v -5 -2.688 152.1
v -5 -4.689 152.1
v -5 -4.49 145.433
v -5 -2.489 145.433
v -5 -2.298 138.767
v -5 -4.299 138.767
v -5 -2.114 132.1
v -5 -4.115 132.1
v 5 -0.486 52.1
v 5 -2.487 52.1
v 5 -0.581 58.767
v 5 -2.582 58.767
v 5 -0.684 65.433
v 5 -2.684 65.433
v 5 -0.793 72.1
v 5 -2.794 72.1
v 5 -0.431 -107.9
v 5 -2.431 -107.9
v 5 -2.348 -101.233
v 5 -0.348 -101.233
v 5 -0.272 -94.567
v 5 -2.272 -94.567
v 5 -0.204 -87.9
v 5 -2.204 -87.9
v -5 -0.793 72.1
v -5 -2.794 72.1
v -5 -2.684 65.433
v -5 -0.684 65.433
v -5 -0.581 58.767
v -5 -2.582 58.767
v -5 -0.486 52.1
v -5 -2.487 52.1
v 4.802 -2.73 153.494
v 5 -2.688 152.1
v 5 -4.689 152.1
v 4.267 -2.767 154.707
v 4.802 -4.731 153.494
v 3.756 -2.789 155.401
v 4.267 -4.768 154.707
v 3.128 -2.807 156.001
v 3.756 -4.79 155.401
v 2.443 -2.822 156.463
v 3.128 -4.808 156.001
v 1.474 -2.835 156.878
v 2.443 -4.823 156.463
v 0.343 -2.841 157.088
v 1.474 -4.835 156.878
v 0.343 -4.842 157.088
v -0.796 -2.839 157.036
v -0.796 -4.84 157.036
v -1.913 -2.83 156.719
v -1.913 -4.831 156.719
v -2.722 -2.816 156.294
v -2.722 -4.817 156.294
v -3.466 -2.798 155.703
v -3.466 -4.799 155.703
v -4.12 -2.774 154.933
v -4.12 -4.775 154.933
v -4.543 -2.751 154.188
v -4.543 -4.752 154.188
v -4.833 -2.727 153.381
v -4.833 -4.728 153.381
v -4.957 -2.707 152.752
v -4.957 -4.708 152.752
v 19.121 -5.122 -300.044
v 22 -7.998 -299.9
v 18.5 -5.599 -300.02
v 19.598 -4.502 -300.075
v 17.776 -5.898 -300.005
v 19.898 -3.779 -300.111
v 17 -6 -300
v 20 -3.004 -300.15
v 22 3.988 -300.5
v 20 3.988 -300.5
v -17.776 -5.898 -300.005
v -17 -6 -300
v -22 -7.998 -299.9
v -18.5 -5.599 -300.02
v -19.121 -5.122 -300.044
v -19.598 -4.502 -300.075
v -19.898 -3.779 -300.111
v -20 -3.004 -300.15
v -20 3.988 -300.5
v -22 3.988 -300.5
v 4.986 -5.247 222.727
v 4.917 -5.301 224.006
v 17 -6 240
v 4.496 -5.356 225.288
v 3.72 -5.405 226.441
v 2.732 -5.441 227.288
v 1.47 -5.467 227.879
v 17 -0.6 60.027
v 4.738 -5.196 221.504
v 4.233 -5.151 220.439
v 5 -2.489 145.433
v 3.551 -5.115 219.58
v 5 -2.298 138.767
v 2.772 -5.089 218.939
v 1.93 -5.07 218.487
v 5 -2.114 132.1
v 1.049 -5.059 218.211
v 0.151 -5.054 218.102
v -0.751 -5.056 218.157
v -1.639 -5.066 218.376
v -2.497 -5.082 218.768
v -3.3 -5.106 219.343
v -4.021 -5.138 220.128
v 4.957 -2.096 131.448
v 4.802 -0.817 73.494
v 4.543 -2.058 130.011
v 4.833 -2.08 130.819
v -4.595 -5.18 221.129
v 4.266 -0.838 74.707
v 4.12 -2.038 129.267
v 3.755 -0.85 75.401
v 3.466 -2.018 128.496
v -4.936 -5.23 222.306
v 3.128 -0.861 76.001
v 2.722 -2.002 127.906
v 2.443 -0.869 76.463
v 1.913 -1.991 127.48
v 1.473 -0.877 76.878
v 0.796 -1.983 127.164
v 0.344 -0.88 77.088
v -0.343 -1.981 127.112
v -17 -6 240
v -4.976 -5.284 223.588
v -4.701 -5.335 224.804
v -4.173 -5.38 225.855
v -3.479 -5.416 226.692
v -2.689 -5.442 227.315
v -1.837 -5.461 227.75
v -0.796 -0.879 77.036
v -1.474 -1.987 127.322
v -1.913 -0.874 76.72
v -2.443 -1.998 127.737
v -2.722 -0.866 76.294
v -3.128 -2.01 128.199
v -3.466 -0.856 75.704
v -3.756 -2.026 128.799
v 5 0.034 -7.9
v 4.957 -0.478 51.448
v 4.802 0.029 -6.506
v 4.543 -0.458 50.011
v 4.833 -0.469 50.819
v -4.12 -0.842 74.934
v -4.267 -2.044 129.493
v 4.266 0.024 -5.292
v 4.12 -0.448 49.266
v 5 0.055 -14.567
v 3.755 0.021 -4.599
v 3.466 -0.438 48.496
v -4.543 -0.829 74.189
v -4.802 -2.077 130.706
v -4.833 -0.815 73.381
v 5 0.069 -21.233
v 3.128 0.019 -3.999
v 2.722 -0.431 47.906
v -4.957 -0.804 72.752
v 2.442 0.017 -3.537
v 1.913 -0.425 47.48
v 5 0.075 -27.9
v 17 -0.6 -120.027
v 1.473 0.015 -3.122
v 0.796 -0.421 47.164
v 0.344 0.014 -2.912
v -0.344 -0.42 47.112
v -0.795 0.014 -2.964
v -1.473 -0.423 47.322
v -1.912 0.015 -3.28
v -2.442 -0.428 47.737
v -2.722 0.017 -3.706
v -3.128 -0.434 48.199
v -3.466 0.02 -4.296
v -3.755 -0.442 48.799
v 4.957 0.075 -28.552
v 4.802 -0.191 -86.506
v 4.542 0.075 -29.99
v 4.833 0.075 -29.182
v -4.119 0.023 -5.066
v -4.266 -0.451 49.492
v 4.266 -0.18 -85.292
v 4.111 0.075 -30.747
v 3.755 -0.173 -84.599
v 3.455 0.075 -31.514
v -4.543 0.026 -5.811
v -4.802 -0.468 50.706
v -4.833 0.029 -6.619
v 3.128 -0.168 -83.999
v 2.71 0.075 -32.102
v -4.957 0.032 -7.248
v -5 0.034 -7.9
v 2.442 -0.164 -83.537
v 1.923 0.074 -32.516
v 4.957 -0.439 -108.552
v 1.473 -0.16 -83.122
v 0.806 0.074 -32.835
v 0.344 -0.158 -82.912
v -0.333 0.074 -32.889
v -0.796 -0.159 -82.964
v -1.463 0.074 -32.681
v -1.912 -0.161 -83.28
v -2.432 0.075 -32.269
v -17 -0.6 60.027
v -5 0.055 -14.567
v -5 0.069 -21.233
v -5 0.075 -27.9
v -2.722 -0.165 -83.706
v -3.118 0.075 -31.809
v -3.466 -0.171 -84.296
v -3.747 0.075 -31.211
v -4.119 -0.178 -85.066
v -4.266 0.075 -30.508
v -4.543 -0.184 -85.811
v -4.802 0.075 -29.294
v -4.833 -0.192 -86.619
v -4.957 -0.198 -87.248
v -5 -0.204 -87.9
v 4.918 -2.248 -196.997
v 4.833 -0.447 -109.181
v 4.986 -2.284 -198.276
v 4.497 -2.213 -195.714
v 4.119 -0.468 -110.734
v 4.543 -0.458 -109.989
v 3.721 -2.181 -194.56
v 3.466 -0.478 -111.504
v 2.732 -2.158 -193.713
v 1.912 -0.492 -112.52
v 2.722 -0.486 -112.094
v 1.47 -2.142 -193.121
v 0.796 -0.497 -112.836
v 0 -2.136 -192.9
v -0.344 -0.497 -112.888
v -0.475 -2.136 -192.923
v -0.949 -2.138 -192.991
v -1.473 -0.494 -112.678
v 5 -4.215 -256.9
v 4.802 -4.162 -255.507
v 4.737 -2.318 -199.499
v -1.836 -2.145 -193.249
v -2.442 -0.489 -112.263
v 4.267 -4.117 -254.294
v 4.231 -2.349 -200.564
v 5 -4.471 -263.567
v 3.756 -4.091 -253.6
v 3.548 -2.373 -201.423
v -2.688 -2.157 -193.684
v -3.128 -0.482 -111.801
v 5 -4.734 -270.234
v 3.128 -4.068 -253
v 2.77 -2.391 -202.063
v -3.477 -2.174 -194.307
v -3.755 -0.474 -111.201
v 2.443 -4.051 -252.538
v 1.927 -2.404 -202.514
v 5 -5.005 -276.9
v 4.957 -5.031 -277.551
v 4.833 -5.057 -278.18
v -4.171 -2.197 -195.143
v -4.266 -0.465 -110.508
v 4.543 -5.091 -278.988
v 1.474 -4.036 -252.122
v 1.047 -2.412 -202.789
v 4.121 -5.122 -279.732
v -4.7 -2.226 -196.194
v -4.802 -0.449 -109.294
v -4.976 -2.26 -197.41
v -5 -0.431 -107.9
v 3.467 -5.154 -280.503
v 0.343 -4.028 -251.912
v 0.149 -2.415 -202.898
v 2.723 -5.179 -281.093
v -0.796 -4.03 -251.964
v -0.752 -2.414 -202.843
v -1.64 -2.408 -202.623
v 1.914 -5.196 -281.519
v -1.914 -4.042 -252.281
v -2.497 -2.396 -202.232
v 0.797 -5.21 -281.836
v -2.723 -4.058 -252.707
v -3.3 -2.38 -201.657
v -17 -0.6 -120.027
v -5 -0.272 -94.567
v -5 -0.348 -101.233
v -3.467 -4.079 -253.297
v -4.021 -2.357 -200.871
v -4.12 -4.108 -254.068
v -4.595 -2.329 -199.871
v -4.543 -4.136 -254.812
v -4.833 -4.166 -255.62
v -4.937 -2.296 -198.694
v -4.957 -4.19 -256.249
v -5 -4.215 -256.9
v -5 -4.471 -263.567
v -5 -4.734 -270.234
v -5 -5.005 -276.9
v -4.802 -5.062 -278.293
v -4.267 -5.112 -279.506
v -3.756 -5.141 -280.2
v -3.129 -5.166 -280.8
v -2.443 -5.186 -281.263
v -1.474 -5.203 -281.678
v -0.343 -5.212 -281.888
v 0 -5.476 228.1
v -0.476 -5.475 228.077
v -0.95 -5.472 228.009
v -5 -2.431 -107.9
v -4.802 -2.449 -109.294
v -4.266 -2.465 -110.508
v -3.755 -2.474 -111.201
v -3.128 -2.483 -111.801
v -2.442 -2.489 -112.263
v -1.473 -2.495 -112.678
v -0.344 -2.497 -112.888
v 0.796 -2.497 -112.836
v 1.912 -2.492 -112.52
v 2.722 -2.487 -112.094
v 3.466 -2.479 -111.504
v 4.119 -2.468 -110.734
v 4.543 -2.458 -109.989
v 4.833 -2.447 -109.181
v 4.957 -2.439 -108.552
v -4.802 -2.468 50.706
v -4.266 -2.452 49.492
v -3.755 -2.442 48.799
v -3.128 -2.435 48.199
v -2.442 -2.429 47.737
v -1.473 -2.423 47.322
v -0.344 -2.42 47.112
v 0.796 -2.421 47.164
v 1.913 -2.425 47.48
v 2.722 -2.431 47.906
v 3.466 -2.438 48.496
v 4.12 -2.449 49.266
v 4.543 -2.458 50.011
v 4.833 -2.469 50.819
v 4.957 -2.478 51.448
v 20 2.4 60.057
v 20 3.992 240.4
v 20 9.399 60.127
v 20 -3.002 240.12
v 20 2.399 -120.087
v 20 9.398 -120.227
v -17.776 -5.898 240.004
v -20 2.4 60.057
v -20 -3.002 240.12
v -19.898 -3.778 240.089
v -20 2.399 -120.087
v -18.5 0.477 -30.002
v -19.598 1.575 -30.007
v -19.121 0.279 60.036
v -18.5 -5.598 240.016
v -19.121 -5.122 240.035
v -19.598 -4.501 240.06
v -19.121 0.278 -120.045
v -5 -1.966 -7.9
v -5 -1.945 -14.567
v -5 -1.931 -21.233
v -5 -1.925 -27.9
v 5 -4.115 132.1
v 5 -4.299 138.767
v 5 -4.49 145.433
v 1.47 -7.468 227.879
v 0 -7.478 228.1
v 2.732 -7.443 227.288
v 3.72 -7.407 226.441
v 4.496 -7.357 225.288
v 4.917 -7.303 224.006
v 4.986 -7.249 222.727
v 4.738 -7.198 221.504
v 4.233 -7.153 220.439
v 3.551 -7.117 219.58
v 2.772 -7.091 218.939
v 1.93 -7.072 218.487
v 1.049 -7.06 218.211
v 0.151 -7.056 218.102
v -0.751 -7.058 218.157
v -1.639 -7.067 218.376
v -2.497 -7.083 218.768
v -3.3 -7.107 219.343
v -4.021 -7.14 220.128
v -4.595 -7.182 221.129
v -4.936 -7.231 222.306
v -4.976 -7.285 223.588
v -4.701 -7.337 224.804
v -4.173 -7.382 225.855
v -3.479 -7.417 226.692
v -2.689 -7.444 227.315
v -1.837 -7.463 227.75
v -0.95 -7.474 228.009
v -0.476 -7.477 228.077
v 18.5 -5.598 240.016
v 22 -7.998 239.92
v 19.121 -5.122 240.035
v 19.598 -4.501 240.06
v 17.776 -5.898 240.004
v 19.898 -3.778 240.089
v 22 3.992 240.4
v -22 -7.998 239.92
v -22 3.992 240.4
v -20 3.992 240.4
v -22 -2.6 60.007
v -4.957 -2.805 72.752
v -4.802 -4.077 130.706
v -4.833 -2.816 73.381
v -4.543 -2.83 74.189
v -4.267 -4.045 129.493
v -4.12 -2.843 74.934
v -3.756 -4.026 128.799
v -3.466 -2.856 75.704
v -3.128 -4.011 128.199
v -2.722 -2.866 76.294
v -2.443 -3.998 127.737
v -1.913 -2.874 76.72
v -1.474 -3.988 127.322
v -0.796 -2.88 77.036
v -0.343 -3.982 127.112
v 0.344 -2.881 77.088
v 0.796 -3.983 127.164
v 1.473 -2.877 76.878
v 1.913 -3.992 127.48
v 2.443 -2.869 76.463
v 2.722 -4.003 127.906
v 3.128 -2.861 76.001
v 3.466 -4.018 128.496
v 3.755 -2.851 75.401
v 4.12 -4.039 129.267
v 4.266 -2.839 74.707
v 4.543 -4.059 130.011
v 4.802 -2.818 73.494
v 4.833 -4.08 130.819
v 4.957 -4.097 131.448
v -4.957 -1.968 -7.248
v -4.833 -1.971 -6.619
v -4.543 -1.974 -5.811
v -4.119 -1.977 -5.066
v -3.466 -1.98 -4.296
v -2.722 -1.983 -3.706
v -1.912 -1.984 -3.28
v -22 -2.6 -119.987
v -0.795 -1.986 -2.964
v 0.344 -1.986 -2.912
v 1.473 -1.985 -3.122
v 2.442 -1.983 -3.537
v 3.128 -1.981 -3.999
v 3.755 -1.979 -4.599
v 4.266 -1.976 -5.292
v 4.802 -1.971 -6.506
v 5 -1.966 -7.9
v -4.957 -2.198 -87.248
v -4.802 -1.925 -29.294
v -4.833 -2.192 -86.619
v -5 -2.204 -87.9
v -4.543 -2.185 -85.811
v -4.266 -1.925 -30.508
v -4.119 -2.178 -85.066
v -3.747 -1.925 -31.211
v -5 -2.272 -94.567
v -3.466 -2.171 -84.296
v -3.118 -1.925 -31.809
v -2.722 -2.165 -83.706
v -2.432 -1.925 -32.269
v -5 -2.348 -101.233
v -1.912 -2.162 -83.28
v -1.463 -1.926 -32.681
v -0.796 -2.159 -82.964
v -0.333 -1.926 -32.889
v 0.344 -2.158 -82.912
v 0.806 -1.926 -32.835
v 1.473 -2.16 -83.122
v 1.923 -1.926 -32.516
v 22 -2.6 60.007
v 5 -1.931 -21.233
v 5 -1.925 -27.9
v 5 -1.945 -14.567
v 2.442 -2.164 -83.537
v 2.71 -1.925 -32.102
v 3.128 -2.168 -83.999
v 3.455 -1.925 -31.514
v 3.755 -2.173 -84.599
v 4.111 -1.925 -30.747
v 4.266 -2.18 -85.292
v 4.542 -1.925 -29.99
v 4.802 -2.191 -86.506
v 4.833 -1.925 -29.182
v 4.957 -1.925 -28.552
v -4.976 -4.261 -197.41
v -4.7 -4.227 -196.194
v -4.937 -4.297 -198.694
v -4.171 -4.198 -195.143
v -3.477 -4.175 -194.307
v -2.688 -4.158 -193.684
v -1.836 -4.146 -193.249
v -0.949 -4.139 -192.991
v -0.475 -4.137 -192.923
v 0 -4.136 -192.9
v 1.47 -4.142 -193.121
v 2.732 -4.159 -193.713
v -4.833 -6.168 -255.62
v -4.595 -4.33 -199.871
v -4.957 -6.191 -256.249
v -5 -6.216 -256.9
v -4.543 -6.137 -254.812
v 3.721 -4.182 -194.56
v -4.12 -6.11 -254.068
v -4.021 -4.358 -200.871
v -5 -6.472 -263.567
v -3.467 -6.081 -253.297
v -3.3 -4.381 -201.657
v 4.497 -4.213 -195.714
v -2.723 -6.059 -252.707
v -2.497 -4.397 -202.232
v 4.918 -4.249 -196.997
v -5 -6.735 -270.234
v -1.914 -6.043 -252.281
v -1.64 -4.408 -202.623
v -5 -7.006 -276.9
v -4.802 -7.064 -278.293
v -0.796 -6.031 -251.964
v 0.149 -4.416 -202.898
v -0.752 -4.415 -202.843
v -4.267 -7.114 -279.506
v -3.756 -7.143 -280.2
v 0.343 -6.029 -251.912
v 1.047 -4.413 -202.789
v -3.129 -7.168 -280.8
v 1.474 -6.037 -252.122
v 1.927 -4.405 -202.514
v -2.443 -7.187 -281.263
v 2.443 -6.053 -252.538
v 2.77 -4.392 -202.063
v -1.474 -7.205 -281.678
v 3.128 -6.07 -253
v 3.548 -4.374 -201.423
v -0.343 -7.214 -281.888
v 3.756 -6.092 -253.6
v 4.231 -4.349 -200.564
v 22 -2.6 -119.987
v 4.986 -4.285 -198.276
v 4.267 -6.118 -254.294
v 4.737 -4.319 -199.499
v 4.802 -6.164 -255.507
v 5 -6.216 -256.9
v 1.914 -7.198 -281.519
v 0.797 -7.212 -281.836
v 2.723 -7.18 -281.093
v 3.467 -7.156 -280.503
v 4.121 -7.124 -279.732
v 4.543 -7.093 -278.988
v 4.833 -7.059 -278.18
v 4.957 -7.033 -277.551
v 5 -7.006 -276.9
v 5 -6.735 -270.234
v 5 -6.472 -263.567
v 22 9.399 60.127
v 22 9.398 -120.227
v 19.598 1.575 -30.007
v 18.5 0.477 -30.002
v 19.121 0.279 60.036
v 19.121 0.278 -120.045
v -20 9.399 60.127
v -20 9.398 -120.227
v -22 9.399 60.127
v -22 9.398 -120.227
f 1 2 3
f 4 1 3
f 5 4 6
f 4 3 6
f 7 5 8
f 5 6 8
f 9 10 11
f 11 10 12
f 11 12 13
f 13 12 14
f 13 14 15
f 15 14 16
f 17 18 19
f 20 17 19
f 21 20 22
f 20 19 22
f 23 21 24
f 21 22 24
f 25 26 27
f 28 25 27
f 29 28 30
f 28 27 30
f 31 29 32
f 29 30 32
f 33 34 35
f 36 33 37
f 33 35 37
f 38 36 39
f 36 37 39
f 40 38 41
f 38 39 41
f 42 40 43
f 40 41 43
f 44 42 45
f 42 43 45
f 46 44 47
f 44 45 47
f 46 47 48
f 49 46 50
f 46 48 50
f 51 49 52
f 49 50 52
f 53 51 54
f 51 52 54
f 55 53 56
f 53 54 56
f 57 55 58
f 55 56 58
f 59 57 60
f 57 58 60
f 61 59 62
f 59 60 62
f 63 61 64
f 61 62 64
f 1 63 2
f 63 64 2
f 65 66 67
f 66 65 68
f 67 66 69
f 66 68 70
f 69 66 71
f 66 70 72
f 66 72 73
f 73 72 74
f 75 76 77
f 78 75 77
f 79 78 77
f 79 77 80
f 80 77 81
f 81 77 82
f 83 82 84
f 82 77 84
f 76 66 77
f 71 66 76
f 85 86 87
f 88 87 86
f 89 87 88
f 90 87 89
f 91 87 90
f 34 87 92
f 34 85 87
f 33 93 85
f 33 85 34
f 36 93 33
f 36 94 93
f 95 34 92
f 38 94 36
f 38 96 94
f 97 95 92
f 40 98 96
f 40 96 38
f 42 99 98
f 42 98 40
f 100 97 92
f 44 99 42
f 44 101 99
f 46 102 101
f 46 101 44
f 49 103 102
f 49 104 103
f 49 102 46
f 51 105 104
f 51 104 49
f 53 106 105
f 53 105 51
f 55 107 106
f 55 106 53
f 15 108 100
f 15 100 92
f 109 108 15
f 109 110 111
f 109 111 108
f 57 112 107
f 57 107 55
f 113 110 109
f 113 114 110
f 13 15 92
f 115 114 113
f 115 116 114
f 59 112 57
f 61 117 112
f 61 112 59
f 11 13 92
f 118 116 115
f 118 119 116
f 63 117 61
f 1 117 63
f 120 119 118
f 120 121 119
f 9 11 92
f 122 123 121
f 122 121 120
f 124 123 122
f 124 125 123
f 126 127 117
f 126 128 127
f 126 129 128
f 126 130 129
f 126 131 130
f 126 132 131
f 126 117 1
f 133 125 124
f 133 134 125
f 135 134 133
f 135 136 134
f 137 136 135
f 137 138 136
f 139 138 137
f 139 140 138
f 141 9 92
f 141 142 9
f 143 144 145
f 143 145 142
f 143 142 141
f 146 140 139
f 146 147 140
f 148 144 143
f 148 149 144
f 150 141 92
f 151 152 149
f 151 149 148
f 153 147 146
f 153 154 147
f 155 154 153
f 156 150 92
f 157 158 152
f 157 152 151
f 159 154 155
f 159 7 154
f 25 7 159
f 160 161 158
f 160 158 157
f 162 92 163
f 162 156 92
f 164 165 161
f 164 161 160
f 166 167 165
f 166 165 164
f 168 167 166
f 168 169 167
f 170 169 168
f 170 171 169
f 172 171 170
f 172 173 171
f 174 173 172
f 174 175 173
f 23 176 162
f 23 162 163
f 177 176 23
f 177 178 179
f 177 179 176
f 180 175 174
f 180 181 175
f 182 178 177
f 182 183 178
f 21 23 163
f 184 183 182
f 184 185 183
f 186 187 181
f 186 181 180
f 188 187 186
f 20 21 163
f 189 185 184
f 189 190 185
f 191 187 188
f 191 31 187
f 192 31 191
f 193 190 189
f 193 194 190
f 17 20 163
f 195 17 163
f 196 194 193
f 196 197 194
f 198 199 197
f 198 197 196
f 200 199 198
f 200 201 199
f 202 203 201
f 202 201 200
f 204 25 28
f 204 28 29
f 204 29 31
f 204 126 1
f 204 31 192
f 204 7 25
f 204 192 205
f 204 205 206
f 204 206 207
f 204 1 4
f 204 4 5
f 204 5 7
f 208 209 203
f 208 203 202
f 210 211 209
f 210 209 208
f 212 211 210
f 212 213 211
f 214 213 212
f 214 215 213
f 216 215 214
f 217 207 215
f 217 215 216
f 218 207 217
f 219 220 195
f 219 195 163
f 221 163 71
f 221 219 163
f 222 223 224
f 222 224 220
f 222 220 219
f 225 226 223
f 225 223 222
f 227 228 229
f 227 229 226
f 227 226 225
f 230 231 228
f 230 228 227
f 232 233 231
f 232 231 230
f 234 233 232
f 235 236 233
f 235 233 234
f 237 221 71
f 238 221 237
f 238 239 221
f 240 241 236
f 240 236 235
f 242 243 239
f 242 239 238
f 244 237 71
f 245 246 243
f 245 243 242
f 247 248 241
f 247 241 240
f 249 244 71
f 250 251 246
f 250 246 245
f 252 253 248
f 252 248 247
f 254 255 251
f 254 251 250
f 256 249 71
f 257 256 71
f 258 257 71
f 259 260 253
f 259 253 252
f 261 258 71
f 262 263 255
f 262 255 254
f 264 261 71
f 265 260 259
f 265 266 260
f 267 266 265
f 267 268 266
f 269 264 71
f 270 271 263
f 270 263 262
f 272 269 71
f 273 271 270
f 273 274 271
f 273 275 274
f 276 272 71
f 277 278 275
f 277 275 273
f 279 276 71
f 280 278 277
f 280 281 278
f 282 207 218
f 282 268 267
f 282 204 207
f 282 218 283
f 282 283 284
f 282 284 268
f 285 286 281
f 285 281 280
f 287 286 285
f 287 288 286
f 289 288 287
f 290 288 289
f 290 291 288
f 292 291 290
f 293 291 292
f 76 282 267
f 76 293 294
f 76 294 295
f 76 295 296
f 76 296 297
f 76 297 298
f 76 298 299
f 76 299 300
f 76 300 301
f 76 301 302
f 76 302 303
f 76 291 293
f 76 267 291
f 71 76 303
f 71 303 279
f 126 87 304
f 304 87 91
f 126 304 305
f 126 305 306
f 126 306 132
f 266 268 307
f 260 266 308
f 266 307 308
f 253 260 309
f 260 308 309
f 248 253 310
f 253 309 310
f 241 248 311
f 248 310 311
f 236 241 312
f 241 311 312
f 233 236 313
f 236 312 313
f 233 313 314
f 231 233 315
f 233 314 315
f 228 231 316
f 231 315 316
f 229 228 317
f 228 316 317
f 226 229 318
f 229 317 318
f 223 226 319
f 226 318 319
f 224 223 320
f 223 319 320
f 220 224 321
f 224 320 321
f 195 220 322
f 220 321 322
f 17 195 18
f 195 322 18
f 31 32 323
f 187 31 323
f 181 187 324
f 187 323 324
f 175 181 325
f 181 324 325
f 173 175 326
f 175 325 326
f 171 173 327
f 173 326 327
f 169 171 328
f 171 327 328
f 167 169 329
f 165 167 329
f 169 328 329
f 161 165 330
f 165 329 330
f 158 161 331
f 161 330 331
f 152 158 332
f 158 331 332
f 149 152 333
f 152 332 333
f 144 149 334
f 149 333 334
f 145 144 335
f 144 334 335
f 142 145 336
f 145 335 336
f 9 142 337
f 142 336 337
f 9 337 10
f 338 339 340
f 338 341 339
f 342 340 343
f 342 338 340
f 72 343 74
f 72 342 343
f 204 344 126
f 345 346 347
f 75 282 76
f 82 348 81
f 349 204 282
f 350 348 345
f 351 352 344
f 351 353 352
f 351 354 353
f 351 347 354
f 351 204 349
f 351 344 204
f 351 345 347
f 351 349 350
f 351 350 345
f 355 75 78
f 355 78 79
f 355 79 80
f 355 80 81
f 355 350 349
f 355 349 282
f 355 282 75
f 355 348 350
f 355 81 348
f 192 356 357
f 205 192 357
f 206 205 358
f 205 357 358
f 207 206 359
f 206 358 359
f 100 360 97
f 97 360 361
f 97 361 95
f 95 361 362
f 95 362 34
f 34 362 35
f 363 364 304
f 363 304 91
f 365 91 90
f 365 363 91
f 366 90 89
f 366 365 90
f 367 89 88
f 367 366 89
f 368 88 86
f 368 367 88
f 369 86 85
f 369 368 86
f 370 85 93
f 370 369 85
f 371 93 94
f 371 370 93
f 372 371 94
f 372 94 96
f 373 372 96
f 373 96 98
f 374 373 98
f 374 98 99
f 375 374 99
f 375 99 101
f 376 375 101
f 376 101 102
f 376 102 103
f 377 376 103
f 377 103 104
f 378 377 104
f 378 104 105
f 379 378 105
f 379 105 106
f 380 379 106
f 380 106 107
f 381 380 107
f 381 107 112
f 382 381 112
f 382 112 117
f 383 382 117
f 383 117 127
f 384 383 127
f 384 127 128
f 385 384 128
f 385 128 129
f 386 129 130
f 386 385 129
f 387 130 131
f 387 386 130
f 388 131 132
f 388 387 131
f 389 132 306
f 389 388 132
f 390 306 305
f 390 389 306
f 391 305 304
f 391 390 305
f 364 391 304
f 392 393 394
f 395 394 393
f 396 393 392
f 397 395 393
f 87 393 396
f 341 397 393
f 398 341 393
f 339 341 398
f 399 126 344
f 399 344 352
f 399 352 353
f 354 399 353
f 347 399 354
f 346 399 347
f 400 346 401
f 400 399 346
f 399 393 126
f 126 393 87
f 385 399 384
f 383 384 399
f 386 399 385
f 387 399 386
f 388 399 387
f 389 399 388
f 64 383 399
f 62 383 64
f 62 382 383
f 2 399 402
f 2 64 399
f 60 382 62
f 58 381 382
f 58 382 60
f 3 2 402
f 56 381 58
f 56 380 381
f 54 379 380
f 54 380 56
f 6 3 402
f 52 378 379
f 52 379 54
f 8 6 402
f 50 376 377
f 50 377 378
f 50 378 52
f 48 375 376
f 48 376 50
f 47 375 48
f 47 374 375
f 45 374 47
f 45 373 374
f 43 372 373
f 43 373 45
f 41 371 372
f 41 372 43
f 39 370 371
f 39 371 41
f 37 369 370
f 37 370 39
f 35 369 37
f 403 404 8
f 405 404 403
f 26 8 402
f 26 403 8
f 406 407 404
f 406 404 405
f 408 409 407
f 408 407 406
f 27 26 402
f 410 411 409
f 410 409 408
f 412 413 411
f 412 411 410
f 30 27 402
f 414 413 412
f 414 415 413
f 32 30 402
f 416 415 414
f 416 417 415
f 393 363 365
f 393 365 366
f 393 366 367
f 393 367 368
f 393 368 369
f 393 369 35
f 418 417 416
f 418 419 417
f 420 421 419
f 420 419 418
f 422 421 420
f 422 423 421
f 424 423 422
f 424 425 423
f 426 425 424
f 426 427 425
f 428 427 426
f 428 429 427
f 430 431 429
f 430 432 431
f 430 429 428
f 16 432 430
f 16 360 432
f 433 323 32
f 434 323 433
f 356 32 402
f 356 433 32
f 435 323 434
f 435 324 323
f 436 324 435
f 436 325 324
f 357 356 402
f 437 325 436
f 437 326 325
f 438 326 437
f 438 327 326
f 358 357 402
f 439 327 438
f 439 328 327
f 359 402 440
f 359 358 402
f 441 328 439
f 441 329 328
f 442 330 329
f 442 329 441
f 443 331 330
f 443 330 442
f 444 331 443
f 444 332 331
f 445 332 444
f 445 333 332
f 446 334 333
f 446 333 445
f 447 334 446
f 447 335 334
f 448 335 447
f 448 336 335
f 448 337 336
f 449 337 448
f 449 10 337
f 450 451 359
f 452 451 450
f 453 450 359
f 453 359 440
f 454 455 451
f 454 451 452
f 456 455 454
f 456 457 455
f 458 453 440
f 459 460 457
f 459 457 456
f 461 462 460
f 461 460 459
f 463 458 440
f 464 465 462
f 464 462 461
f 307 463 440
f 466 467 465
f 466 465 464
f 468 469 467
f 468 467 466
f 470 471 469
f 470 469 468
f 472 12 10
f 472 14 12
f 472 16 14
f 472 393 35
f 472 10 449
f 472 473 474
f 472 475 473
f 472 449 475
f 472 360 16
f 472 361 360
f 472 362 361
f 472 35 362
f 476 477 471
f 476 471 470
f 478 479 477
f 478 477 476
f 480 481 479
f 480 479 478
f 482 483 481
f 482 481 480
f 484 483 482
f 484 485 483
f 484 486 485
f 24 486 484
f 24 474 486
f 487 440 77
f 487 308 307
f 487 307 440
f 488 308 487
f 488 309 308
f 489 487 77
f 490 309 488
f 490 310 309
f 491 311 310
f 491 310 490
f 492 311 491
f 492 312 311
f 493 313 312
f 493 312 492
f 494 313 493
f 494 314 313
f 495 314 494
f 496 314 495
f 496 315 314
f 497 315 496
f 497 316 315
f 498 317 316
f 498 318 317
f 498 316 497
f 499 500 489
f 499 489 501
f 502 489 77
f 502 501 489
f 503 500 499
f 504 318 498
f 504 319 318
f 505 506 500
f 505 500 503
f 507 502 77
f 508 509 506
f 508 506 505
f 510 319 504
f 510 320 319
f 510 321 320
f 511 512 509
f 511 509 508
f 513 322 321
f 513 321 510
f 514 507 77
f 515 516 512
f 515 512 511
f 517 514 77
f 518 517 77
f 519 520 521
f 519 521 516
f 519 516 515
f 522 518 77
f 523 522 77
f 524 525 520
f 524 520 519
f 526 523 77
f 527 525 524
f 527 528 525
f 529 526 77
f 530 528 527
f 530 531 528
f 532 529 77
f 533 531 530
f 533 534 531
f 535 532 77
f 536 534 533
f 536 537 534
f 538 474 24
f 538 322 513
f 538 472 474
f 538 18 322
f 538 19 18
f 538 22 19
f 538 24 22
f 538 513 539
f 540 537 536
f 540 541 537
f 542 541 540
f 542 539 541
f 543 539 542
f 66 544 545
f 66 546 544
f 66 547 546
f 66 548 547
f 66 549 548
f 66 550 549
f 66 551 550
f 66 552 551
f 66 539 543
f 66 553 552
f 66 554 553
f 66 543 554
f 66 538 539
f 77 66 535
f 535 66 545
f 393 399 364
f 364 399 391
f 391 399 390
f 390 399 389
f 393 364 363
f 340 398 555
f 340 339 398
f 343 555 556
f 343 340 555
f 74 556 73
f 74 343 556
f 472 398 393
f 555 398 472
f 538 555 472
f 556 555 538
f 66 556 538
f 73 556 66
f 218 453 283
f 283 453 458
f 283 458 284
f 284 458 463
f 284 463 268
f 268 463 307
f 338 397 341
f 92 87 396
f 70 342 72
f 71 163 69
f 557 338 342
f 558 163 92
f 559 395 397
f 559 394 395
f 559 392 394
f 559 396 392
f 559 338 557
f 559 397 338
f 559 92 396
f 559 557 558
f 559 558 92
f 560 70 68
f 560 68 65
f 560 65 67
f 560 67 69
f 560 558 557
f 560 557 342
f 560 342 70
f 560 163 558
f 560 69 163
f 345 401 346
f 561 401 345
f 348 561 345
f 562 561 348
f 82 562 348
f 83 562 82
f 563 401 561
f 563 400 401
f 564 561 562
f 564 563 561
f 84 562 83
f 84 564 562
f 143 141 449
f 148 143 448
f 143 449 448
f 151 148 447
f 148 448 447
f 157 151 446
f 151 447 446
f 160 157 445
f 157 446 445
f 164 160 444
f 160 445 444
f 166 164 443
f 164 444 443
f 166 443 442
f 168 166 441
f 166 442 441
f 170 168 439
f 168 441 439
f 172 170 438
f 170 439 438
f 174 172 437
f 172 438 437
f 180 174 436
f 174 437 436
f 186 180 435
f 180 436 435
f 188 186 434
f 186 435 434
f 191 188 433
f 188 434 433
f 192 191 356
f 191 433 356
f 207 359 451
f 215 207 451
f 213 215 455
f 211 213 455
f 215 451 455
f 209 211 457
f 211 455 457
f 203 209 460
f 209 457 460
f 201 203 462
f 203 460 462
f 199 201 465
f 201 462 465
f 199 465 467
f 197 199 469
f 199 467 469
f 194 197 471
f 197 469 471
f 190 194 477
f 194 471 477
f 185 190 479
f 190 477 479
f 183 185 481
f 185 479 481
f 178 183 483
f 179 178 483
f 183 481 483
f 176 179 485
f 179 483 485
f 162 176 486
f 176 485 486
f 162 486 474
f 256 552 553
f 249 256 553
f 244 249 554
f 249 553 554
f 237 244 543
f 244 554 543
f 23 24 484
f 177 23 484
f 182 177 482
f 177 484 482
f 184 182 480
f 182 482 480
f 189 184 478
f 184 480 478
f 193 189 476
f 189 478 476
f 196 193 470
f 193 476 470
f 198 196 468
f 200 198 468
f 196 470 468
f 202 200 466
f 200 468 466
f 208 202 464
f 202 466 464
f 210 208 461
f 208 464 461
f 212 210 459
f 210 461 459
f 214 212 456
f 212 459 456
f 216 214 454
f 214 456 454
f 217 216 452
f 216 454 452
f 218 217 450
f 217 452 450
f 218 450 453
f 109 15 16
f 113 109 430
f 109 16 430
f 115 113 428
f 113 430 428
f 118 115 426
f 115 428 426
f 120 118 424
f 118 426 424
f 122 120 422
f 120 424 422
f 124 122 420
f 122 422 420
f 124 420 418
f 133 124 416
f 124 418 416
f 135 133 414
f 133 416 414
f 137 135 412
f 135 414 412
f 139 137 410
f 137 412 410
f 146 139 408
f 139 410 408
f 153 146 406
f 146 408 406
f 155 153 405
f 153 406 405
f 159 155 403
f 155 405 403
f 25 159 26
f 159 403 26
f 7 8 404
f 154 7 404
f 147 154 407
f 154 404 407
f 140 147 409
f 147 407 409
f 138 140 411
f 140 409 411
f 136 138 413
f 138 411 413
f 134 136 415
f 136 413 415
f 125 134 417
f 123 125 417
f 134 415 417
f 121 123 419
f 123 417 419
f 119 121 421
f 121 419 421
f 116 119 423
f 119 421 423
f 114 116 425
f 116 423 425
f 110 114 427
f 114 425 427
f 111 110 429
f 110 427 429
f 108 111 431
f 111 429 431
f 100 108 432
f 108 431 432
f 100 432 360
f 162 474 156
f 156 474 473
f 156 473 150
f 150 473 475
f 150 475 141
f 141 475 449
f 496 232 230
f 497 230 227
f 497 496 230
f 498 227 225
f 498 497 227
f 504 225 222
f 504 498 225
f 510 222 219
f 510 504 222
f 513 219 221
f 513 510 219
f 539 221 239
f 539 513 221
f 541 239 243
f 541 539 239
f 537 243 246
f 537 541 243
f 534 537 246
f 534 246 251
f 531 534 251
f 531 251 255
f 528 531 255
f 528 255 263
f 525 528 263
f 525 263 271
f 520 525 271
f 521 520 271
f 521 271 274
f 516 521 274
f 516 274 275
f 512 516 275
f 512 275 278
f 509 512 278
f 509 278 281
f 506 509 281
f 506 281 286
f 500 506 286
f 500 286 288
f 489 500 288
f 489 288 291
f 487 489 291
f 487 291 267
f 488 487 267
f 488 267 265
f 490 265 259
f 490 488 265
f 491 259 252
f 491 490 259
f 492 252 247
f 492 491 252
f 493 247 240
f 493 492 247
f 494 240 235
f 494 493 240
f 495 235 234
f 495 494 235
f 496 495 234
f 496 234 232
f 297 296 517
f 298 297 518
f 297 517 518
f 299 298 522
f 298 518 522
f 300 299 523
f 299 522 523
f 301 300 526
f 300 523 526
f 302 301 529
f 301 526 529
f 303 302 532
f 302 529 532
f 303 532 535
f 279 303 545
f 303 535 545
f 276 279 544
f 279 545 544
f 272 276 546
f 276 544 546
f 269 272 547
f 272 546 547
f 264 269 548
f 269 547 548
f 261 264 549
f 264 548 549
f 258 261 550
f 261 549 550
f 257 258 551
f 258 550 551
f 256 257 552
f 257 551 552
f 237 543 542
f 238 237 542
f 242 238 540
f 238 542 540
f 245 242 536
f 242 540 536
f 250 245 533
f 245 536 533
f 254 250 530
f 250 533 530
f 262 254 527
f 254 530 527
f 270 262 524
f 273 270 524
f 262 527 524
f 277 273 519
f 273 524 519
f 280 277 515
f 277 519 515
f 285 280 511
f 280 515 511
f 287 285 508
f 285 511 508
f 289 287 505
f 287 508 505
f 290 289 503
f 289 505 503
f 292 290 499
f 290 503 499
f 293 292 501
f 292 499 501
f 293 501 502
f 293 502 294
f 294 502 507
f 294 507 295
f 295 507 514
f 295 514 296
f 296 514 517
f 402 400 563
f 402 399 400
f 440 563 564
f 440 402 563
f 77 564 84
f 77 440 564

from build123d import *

# Parameters (mm, degrees)
VARIOUS_MOUNTING_POINTS_DEPTH      = 302.472328172
VARIOUS_MOUNTING_POINTS_DEPTH_BACK = 302.472328172
SKETCH4_R                          = 5


with BuildPart() as part:
    # Sweep1: sweep along a path in Sketch3
    with BuildLine(Plane(origin=(0, 0, 0), x_dir=(0, 0, -1), z_dir=(1, 0, 0))) as sweep1_path:
        ThreePointArc((-240, -6), (30, 0.074962051), (300, -6))
    # Sketch1 → Sweep1 (sweep)
    with BuildSketch(Plane.XY):
        with BuildLine():
            Line((-17, 0), (17, 0))
            ThreePointArc((17, 0), (19.121320344, 0.878679656), (20, 3))
            Line((20, 3), (20, 10))
            Line((20, 10), (22, 10))
            Line((22, 10), (22, -2))
            Line((22, -2), (-22, -2))
            Line((-22, -2), (-22, 10))
            Line((-22, 10), (-20, 10))
            Line((-20, 10), (-20, 3))
            ThreePointArc((-20, 3), (-19.121320344, 0.878679656), (-17, 0))
        make_face()
    sweep(path=sweep1_path.line)

    # Sketch4 → Various mounting points (cut, two sides: drawn at the far end of the back side and taken through both)
    with BuildSketch(Plane(origin=(0, 0, 0), x_dir=(1, 0, 0), z_dir=(0, 1, 0)).offset(-VARIOUS_MOUNTING_POINTS_DEPTH_BACK)):
        with Locations(Location((0, 197.900062461, 0), (0, 0, 270))):
            Circle(SKETCH4_R)
        with Locations(Location((0, -223.099937539, 0), (0, 0, 270))):
            Circle(SKETCH4_R)
        with BuildLine():
            Line((-5, 256.900062461), (-5, 276.900062461))
            ThreePointArc((-5, 276.900062461), (0, 281.900062461), (5, 276.900062461))
            Line((5, 276.900062461), (5, 256.900062461))
            ThreePointArc((5, 256.900062461), (0, 251.900062461), (-5, 256.900062461))
        make_face()
        with BuildLine():
            Line((-5, 87.900062461), (-5, 107.900062461))
            ThreePointArc((-5, 107.900062461), (0, 112.900062461), (5, 107.900062461))
            Line((5, 107.900062461), (5, 87.900062461))
            ThreePointArc((5, 87.900062461), (0, 82.900062461), (-5, 87.900062461))
        make_face()
        with BuildLine():
            Line((-5, 7.900062461), (-5, 27.900062461))
            ThreePointArc((-5, 27.900062461), (0, 32.900062461), (5, 27.900062461))
            Line((5, 27.900062461), (5, 7.900062461))
            ThreePointArc((5, 7.900062461), (0, 2.900062461), (-5, 7.900062461))
        make_face()
        with BuildLine():
            Line((-5, -72.099937539), (-5, -52.099937539))
            ThreePointArc((-5, -52.099937539), (0, -47.099937539), (5, -52.099937539))
            Line((5, -52.099937539), (5, -72.099937539))
            ThreePointArc((5, -72.099937539), (0, -77.099937539), (-5, -72.099937539))
        make_face()
        with BuildLine():
            Line((-5, -152.099937539), (-5, -132.099937539))
            ThreePointArc((-5, -132.099937539), (0, -127.099937539), (5, -132.099937539))
            Line((5, -132.099937539), (5, -152.099937539))
            ThreePointArc((5, -152.099937539), (0, -157.099937539), (-5, -152.099937539))
        make_face()
    extrude(amount=VARIOUS_MOUNTING_POINTS_DEPTH + VARIOUS_MOUNTING_POINTS_DEPTH_BACK, mode=Mode.SUBTRACT)


solid = part.part
